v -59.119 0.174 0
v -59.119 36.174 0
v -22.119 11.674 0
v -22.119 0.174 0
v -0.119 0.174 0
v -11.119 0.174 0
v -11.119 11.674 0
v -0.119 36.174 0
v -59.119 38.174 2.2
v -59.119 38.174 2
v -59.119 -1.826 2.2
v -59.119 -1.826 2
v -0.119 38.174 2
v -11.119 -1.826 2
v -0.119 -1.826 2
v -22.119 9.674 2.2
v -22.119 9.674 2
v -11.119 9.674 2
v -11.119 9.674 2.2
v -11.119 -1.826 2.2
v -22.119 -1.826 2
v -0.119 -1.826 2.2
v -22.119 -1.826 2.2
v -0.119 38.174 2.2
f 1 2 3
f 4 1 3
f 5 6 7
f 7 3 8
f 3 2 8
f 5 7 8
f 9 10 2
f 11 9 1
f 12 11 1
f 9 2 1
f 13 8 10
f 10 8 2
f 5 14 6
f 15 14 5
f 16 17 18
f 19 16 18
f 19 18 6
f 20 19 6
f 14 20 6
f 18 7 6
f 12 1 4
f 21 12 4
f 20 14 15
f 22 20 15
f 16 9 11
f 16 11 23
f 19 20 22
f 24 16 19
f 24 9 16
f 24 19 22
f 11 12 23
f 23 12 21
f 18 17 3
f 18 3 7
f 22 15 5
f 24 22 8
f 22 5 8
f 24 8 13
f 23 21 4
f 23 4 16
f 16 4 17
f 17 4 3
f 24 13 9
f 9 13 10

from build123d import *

# Parameters (mm, degrees)
F1_DEPTH = 2.2
F2_SIZE  = 2
F3_SIZE  = 2


with BuildPart() as f1:
    # F0 (on Top) → F1 (new body)
    with BuildSketch(Plane.XY):
        Polygon((-0.1190041415, 38.1740419386), (-59.1190041415, 38.1740419386), (-59.1190041415, -1.8259580614), (-22.1190041415, -1.8259580614), (-22.1190041415, 9.6740419386), (-11.1190041415, 9.6740419386), (-11.1190041415, -1.8259580614), (-0.1190041415, -1.8259580614), align=None)
    extrude(amount=F1_DEPTH)

    # F2
    f2_edges = [f1.edges().sort_by_distance(p)[0] for p in [
        (-29.619004, 38.174042, 0),
        (-40.619004, -1.825958, 0),
    ]]
    chamfer(f2_edges, length=F2_SIZE)

    # F3
    f3_edges = [f1.edges().sort_by_distance(p)[0] for p in [
        (-16.619004, 9.674042, 0),
        (-5.619004, -1.825958, 0),
    ]]
    chamfer(f3_edges, length=F3_SIZE)


solid = f1.part
